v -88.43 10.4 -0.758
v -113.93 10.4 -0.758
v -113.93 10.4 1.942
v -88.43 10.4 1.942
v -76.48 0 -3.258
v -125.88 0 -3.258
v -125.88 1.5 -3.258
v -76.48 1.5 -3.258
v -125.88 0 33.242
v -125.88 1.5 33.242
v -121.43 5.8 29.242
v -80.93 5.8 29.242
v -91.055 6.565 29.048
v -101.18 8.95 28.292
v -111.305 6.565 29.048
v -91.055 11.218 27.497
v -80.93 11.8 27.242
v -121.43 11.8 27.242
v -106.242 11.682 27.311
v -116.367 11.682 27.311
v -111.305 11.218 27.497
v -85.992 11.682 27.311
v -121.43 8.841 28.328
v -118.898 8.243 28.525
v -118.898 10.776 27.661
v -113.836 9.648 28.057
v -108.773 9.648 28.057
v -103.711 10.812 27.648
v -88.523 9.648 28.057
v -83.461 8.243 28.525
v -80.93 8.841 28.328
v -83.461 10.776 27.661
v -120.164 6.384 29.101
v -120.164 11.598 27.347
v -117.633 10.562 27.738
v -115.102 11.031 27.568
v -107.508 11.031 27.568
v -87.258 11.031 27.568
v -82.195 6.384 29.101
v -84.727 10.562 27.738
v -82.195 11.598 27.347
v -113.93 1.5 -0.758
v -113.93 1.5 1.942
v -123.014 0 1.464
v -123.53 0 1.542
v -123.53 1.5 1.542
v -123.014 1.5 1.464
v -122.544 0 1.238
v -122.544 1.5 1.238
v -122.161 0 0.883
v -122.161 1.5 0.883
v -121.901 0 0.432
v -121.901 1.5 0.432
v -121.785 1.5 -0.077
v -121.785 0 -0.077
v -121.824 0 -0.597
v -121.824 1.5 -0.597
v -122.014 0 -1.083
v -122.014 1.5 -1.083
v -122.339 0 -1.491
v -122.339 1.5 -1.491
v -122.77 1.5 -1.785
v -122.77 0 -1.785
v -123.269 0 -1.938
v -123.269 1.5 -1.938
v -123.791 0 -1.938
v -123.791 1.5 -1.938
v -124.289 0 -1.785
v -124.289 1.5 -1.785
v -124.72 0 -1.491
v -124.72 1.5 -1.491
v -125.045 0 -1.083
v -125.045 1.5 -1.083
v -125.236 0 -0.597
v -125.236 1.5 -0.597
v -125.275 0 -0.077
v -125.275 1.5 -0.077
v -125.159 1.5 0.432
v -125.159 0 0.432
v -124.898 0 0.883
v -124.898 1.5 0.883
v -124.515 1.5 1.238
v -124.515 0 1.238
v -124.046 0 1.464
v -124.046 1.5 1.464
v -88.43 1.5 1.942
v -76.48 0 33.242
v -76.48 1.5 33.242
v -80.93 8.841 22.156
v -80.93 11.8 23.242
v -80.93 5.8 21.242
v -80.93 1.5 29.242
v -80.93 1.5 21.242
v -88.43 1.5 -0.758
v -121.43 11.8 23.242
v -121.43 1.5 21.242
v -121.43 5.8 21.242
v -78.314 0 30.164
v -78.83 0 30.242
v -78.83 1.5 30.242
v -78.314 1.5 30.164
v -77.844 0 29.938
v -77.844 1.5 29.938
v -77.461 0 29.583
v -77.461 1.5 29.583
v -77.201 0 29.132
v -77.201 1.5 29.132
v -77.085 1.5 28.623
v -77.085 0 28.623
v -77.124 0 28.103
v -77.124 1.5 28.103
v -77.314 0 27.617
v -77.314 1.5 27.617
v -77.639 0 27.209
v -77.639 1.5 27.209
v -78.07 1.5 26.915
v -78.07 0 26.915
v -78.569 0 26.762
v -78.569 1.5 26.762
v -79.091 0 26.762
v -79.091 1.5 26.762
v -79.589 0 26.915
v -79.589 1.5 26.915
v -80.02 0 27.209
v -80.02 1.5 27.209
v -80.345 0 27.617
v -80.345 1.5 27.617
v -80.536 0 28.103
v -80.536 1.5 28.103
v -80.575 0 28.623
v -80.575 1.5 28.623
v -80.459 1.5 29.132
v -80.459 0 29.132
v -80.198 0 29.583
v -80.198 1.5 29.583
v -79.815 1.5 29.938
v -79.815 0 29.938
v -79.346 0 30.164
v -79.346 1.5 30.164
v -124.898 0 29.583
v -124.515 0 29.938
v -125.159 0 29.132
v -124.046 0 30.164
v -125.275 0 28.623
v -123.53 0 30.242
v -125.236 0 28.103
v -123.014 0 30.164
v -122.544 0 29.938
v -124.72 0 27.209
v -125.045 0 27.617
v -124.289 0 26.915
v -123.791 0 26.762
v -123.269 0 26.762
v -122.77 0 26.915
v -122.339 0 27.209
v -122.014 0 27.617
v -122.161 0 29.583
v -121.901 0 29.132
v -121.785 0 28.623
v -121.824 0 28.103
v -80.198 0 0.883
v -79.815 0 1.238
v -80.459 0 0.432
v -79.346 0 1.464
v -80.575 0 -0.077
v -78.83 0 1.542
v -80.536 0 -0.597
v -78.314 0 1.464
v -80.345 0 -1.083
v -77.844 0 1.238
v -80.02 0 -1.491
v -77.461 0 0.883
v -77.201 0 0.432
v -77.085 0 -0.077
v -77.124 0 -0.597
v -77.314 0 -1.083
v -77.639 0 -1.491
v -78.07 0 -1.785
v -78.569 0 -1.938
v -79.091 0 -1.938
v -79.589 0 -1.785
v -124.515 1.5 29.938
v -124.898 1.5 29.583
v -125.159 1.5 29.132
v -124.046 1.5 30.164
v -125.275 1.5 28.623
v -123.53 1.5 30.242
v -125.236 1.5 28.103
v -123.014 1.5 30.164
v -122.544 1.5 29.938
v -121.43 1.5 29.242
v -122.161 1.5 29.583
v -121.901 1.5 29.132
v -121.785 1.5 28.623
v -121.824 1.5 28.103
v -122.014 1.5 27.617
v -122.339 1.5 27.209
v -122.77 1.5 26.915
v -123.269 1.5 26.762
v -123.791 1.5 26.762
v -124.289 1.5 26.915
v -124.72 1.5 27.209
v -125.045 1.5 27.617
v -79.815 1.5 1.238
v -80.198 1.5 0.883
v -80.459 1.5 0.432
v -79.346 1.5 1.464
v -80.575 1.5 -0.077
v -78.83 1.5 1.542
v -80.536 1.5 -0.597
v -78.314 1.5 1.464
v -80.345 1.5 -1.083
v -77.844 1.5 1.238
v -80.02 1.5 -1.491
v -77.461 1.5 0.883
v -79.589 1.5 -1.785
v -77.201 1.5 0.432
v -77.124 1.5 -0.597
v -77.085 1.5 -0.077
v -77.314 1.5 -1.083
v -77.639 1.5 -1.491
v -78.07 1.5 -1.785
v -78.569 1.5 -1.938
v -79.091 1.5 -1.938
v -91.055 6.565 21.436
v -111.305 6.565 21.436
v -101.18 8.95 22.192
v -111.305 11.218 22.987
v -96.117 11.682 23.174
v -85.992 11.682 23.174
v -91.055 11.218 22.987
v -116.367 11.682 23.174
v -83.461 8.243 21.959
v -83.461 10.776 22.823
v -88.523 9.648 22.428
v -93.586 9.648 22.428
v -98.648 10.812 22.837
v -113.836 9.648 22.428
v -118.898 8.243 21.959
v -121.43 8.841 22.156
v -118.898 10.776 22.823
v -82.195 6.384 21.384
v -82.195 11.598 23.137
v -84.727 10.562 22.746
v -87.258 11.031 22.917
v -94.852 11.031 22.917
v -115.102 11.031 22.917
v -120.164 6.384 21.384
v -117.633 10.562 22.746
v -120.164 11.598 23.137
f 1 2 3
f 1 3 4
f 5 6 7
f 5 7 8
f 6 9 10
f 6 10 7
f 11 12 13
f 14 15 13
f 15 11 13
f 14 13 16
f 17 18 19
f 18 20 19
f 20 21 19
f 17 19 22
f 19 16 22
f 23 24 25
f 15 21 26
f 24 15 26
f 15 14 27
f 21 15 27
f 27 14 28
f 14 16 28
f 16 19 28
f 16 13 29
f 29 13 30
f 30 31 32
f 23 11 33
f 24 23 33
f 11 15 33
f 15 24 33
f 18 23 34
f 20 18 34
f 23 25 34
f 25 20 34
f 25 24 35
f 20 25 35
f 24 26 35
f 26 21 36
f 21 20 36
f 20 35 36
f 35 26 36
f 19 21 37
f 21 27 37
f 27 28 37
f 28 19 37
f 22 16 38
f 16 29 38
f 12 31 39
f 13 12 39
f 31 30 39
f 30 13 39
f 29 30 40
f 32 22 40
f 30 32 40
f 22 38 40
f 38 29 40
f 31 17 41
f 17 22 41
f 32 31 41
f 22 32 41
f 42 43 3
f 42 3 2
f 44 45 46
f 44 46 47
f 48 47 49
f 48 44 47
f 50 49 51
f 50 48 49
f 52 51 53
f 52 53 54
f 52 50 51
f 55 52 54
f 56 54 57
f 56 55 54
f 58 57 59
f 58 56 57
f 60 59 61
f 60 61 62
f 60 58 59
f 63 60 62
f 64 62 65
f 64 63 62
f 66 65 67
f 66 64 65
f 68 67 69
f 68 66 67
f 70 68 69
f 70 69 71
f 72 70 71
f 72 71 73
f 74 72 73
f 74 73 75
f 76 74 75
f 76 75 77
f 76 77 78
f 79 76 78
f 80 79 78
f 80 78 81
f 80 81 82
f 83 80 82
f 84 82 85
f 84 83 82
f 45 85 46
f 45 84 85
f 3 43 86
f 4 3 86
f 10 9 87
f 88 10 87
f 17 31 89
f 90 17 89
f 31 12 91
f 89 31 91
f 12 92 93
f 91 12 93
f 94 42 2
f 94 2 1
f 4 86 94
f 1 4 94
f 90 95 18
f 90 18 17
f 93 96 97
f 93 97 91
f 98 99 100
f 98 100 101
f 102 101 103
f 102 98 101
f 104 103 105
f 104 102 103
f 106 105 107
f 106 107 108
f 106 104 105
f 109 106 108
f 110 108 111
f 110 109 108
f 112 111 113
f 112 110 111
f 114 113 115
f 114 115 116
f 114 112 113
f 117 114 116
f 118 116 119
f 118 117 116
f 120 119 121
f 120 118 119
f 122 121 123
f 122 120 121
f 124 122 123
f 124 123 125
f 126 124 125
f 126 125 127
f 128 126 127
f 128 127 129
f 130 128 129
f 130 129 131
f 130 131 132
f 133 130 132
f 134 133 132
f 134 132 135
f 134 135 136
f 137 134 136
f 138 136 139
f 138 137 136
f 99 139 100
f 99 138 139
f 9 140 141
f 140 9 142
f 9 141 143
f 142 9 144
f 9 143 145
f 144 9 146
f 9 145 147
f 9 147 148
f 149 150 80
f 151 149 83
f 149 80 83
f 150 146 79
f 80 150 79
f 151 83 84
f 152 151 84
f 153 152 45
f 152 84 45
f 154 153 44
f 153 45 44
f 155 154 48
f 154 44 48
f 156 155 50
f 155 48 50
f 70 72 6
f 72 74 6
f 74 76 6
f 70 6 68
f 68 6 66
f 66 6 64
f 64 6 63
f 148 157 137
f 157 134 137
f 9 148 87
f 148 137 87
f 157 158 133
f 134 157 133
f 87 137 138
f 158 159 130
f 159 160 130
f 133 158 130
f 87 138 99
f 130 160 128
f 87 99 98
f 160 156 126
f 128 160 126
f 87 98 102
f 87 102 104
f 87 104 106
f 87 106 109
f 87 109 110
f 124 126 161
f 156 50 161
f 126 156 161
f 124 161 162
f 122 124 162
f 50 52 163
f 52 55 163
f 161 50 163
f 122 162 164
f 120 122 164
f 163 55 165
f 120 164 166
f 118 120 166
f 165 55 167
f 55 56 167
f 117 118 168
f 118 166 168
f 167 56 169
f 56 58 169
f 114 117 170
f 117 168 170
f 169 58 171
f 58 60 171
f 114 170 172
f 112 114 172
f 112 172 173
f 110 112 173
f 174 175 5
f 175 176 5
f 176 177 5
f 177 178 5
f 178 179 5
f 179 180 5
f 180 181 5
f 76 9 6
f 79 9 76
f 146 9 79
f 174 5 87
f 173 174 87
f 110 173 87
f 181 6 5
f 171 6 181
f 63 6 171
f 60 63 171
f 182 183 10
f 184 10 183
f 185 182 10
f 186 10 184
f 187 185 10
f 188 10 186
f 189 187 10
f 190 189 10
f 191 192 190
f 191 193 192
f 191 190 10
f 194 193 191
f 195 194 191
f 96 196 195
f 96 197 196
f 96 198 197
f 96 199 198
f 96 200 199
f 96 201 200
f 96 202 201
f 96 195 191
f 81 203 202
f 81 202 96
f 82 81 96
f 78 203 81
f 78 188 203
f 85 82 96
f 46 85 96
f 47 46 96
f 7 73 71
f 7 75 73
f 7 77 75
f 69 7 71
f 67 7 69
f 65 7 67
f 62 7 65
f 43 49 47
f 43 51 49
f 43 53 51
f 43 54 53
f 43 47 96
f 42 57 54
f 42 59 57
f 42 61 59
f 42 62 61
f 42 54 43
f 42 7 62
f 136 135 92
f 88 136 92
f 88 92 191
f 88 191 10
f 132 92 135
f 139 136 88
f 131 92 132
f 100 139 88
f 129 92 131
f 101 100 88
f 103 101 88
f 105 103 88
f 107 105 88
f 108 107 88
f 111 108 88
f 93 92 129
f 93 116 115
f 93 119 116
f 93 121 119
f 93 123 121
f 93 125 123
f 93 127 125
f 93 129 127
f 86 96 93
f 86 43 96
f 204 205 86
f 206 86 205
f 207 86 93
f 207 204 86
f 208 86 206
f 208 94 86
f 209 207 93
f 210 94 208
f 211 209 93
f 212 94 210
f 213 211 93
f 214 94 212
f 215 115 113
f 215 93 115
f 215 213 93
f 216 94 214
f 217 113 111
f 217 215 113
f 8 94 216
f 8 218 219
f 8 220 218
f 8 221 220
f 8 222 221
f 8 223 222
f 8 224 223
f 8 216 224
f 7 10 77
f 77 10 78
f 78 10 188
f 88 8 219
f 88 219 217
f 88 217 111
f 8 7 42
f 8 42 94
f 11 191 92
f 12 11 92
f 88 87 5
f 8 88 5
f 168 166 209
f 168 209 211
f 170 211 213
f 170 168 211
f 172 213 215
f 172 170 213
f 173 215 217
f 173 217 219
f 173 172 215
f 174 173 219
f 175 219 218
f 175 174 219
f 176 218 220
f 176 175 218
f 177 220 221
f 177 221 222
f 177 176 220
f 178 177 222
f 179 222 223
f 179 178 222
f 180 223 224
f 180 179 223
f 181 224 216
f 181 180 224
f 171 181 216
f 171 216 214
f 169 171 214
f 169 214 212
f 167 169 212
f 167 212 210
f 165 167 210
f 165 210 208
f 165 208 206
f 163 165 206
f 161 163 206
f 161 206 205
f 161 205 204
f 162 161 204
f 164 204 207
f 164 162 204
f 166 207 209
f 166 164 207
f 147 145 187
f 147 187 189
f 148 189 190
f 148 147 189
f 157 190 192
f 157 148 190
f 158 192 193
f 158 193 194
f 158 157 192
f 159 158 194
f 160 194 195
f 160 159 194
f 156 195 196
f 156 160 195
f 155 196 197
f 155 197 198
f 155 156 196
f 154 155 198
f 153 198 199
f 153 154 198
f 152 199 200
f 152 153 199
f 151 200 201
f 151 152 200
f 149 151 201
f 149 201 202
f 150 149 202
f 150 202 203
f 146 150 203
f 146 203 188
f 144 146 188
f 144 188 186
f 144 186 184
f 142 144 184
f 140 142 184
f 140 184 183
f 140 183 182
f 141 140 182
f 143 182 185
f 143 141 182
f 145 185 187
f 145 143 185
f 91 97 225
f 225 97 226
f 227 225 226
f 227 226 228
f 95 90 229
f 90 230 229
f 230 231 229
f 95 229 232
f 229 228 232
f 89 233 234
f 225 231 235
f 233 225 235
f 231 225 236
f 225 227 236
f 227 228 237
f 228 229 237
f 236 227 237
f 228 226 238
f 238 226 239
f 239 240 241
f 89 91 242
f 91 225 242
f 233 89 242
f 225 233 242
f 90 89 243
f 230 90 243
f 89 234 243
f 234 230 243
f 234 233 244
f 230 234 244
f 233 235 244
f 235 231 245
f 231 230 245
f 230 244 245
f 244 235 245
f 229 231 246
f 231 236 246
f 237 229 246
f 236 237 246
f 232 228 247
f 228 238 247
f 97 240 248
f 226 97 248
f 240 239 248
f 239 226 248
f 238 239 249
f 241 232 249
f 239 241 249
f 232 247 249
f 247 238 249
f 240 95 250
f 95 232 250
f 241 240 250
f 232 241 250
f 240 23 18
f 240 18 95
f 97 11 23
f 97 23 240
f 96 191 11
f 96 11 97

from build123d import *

# Parameters (mm, degrees)
SKETCH1_W           = 49.4
SKETCH1_H           = 36.5
SKETCH1_R           = 1.75
BOSS_EXTRUDE1_DEPTH = 1.5
SKETCH1_3_W         = 40.5
SKETCH1_3_H         = 8
BOSS_EXTRUDE2_DEPTH = 11.8
FILLET1_SIZE        = 6
FILLET1_SIZE_2      = 2
FILLET2_SIZE        = 6
FILLET2_SIZE_2      = 2
SKETCH1_4_W         = 25.5
SKETCH1_4_H         = 2.7
BOSS_EXTRUDE3_DEPTH = 10.4


with BuildPart() as part:
    # Sketch1 → Boss-Extrude1 (new body)
    with BuildSketch(Plane(origin=(0, 0, 0), x_dir=(1, 0, 0), z_dir=(0, 1, 0))):
        with Locations((-101.179682497, -14.992188262)):
            Rectangle(SKETCH1_W, SKETCH1_H)
        with Locations(Location((-123.529682497, 0.207811738, 0), (0, 0, 270))):
            Circle(SKETCH1_R, mode=Mode.SUBTRACT)
        with Locations(Location((-78.829682497, 0.207811738, 0), (0, 0, 270))):
            Circle(SKETCH1_R, mode=Mode.SUBTRACT)
        with Locations(Location((-123.529682497, -28.492188262, 0), (0, 0, 270))):
            Circle(SKETCH1_R, mode=Mode.SUBTRACT)
        with Locations(Location((-78.829682497, -28.492188262, 0), (0, 0, 270))):
            Circle(SKETCH1_R, mode=Mode.SUBTRACT)
    extrude(amount=BOSS_EXTRUDE1_DEPTH)

    # Sketch1<3> → Boss-Extrude2 (add)
    with BuildSketch(Plane(origin=(0, 0, 0), x_dir=(1, 0, 0), z_dir=(0, 1, 0))):
        with Locations((-101.179682497, -25.242188262)):
            Rectangle(SKETCH1_3_W, SKETCH1_3_H)
    extrude(amount=BOSS_EXTRUDE2_DEPTH)

    # Fillet1
    # a fillet whose section is not a circle: 6, 2 mm, written as the material it takes off along each edge
    with BuildSketch(Plane(origin=(-136.429682497, 11.8, 21.242188262), x_dir=(0, -1, 0), z_dir=(1, 0, 0))) as fillet1_piece_1:
        with BuildLine():
            Bezier((FILLET1_SIZE, 0), (0, 0), (0, -FILLET1_SIZE_2), weights=[1, 0.052631579, 1])
            Line((0, -FILLET1_SIZE_2), (0, 0))
            Line((0, 0), (FILLET1_SIZE, 0))
        make_face()
    extrude(amount=70.5, mode=Mode.SUBTRACT)

    # Fillet2
    # a fillet whose section is not a circle: 6, 2 mm, written as the material it takes off along each edge
    with BuildSketch(Plane(origin=(-65.929682497, 11.8, 29.242188262), x_dir=(0, -1, 0), z_dir=(-1, 0, 0))) as fillet2_piece_1:
        with BuildLine():
            Bezier((FILLET2_SIZE, 0), (0, 0), (0, -FILLET2_SIZE_2), weights=[1, 0.052631579, 1])
            Line((0, -FILLET2_SIZE_2), (0, 0))
            Line((0, 0), (FILLET2_SIZE, 0))
        make_face()
    extrude(amount=70.5, mode=Mode.SUBTRACT)

    # Sketch1<4> → Boss-Extrude3 (add)
    with BuildSketch(Plane(origin=(0, 0, 0), x_dir=(1, 0, 0), z_dir=(0, 1, 0))):
        with Locations((-101.179682497, -0.592188262)):
            Rectangle(SKETCH1_4_W, SKETCH1_4_H)
    extrude(amount=BOSS_EXTRUDE3_DEPTH)


solid = part.part
